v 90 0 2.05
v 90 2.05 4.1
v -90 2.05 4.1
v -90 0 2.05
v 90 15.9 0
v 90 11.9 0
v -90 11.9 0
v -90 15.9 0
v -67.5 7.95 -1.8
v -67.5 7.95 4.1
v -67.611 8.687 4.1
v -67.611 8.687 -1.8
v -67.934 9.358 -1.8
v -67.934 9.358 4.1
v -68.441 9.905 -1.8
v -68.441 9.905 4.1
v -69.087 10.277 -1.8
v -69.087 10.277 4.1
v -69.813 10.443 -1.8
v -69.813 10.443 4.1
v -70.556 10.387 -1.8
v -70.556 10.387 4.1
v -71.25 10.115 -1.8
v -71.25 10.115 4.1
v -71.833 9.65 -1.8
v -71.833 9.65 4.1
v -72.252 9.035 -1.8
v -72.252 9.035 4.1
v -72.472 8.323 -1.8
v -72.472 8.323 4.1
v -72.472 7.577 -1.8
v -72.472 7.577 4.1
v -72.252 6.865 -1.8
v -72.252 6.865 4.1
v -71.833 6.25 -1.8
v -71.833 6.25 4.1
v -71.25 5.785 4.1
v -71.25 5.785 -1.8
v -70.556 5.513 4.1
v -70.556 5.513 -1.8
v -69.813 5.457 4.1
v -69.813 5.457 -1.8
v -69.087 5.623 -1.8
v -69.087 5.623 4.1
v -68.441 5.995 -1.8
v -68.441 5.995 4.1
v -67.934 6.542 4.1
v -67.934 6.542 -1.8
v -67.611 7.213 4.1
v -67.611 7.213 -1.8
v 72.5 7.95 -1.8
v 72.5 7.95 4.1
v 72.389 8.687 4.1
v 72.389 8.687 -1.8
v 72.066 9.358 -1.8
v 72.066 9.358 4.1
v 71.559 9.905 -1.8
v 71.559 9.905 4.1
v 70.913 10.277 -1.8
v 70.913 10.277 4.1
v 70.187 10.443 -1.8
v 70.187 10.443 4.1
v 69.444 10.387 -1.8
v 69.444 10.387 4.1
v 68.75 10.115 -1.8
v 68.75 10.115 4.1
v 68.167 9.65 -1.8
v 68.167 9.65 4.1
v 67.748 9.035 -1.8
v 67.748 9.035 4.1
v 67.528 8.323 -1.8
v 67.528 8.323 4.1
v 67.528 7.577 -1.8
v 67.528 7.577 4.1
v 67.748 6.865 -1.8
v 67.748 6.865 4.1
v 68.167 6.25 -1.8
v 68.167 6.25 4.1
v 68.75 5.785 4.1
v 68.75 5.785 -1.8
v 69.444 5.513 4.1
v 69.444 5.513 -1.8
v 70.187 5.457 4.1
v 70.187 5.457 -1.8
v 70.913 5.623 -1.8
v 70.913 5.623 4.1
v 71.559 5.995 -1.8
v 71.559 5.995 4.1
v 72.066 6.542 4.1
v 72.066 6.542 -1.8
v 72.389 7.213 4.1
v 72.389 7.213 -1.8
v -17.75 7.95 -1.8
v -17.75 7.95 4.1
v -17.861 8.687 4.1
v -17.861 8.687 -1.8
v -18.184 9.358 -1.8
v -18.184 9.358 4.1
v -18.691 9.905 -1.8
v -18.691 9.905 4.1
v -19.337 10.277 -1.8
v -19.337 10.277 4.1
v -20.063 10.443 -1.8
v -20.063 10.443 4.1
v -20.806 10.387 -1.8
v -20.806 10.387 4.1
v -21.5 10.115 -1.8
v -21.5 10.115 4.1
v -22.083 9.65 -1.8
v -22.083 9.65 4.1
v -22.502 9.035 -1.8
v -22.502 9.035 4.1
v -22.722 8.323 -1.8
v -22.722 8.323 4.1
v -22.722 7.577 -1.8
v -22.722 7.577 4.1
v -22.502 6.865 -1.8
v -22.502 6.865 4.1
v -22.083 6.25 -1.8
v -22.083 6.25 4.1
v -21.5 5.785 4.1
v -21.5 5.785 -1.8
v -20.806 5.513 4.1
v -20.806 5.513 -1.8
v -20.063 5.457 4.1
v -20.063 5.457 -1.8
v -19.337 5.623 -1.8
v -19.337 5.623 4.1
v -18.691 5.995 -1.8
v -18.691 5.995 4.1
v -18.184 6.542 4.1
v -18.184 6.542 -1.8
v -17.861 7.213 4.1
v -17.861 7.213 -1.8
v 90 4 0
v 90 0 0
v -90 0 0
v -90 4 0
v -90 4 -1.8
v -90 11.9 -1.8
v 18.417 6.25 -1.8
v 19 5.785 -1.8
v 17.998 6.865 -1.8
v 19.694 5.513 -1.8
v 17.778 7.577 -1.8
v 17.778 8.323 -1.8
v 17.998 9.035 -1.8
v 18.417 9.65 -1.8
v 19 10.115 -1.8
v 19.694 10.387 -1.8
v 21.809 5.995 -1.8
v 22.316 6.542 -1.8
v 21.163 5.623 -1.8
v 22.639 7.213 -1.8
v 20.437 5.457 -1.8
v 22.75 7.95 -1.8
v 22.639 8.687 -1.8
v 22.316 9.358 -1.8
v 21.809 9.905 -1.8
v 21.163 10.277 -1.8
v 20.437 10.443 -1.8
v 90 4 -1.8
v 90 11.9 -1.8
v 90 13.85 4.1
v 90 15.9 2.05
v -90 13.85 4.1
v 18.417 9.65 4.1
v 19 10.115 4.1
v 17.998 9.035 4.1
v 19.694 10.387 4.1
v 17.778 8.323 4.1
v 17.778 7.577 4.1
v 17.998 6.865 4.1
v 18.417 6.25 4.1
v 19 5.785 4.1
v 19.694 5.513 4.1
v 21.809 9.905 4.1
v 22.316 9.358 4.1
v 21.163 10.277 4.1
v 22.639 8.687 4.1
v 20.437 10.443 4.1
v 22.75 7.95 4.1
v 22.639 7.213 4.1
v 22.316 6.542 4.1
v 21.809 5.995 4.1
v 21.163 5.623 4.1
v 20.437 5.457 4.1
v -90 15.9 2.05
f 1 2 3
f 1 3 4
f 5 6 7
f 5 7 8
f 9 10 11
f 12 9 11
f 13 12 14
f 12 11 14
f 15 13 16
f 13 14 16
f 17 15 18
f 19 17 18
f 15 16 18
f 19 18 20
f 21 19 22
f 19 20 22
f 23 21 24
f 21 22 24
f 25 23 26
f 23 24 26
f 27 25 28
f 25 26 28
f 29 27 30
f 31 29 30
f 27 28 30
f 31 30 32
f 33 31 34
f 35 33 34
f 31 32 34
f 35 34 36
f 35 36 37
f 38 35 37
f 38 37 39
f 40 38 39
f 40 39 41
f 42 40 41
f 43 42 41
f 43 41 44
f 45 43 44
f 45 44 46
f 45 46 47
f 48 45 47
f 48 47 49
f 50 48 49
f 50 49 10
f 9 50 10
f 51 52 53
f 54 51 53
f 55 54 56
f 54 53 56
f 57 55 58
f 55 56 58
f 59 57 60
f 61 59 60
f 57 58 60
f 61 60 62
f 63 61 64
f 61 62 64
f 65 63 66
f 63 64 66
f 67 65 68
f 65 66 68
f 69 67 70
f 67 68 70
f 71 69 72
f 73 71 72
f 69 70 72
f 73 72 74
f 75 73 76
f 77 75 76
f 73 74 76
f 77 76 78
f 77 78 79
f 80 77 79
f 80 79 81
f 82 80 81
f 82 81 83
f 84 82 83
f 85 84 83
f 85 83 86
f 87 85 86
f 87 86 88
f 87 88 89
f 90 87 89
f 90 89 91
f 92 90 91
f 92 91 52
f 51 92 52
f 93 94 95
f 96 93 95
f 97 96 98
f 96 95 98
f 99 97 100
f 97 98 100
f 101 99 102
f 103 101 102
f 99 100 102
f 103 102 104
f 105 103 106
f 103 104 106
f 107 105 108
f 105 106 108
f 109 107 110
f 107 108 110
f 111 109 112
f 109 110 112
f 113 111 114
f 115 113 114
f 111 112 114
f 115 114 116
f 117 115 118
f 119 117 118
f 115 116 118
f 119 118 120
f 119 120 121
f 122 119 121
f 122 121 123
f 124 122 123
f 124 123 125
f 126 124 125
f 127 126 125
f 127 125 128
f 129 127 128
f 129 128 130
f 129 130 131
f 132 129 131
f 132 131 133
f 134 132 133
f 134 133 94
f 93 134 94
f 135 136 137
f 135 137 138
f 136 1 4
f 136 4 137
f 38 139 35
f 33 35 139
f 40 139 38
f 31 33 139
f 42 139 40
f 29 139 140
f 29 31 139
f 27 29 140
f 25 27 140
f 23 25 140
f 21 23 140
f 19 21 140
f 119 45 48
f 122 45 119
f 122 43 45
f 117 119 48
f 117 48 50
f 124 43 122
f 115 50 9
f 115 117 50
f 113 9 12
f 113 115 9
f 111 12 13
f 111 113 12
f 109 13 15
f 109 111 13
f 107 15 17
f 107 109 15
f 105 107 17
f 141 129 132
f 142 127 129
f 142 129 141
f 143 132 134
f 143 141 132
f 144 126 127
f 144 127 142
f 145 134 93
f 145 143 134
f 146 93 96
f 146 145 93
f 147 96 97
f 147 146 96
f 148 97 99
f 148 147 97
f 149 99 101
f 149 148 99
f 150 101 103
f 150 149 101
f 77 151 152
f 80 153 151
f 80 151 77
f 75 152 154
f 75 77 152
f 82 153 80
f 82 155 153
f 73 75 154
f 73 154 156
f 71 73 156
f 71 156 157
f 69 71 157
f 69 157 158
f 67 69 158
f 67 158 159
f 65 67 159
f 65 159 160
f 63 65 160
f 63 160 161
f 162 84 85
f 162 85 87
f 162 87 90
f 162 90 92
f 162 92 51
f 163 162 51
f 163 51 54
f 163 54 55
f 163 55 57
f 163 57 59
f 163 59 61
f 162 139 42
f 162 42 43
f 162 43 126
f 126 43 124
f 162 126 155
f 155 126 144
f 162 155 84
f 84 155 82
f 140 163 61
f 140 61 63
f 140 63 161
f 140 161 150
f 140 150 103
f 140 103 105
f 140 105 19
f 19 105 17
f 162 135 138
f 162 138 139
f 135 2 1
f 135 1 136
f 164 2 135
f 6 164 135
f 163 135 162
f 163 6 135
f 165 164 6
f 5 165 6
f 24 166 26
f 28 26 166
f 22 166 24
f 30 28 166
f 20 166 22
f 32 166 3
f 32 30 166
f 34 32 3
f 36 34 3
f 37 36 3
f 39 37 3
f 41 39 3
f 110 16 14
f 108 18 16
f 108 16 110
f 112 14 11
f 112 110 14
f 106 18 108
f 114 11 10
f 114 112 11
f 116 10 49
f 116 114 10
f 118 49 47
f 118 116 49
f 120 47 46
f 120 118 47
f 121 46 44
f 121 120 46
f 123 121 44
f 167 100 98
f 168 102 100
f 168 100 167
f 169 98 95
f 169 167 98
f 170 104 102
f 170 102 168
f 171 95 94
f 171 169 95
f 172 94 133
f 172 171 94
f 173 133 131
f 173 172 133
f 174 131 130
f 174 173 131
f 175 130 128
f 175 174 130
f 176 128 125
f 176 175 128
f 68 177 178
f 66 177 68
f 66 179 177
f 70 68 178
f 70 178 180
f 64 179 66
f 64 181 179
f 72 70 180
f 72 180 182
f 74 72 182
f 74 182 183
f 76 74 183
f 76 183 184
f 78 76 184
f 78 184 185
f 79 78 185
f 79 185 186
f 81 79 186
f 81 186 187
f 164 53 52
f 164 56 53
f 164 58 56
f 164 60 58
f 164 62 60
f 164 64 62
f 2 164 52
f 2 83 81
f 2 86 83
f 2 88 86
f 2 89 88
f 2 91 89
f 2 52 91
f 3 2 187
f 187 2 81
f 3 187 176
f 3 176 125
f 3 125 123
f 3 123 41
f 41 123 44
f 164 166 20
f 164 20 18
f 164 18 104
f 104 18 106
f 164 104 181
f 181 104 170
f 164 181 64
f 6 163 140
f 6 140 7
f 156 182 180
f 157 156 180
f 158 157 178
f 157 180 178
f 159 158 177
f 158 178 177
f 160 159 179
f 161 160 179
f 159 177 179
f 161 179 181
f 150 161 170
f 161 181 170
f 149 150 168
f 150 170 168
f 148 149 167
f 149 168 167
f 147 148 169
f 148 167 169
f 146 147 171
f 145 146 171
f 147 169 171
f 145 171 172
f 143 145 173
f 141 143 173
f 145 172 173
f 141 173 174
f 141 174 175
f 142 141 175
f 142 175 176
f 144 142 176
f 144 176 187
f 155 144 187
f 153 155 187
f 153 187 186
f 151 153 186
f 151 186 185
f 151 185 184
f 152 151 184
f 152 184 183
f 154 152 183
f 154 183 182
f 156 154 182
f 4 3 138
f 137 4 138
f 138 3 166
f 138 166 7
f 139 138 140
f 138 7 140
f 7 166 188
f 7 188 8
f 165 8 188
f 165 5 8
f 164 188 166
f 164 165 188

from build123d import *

# Parameters (mm, degrees)
EXTRUDE_1_DEPTH        = 90
HOLE_WIZARD_M6_1_D     = 5
HOLE_WIZARD_M6_1_DEPTH = 28
HOLE_WIZARD_M6_1_TIP   = 1.502151548


with BuildPart() as part:
    # 草图1 → 凸台-拉伸1 (new, symmetric)
    with BuildSketch(Plane(origin=(0, 0, 0), x_dir=(0, 0, -1), z_dir=(1, 0, 0))):
        Polygon((-4.1, 13.85), (-4.1, 2.05), (-2.05, 0), (0, 0), (0, 4), (1.8, 4), (1.8, 11.9), (0, 11.9), (0, 15.9), (-2.05, 15.9), align=None)
    extrude(amount=EXTRUDE_1_DEPTH, both=True)

    # M6 螺纹孔1
    with Locations(Plane(origin=(70, 7.95, -1.8), x_dir=(-1, 0, 0), z_dir=(0, 0, -1))):
        with Locations((0, 0), (49.75, 0), (90.25, 0), (140, 0)):
            Hole(HOLE_WIZARD_M6_1_D / 2, depth=HOLE_WIZARD_M6_1_DEPTH)
            with Locations((0, 0, -(HOLE_WIZARD_M6_1_DEPTH + HOLE_WIZARD_M6_1_TIP / 2))):  # 118° drill point
                Cone(0, HOLE_WIZARD_M6_1_D / 2, HOLE_WIZARD_M6_1_TIP, mode=Mode.SUBTRACT)


solid = part.part
